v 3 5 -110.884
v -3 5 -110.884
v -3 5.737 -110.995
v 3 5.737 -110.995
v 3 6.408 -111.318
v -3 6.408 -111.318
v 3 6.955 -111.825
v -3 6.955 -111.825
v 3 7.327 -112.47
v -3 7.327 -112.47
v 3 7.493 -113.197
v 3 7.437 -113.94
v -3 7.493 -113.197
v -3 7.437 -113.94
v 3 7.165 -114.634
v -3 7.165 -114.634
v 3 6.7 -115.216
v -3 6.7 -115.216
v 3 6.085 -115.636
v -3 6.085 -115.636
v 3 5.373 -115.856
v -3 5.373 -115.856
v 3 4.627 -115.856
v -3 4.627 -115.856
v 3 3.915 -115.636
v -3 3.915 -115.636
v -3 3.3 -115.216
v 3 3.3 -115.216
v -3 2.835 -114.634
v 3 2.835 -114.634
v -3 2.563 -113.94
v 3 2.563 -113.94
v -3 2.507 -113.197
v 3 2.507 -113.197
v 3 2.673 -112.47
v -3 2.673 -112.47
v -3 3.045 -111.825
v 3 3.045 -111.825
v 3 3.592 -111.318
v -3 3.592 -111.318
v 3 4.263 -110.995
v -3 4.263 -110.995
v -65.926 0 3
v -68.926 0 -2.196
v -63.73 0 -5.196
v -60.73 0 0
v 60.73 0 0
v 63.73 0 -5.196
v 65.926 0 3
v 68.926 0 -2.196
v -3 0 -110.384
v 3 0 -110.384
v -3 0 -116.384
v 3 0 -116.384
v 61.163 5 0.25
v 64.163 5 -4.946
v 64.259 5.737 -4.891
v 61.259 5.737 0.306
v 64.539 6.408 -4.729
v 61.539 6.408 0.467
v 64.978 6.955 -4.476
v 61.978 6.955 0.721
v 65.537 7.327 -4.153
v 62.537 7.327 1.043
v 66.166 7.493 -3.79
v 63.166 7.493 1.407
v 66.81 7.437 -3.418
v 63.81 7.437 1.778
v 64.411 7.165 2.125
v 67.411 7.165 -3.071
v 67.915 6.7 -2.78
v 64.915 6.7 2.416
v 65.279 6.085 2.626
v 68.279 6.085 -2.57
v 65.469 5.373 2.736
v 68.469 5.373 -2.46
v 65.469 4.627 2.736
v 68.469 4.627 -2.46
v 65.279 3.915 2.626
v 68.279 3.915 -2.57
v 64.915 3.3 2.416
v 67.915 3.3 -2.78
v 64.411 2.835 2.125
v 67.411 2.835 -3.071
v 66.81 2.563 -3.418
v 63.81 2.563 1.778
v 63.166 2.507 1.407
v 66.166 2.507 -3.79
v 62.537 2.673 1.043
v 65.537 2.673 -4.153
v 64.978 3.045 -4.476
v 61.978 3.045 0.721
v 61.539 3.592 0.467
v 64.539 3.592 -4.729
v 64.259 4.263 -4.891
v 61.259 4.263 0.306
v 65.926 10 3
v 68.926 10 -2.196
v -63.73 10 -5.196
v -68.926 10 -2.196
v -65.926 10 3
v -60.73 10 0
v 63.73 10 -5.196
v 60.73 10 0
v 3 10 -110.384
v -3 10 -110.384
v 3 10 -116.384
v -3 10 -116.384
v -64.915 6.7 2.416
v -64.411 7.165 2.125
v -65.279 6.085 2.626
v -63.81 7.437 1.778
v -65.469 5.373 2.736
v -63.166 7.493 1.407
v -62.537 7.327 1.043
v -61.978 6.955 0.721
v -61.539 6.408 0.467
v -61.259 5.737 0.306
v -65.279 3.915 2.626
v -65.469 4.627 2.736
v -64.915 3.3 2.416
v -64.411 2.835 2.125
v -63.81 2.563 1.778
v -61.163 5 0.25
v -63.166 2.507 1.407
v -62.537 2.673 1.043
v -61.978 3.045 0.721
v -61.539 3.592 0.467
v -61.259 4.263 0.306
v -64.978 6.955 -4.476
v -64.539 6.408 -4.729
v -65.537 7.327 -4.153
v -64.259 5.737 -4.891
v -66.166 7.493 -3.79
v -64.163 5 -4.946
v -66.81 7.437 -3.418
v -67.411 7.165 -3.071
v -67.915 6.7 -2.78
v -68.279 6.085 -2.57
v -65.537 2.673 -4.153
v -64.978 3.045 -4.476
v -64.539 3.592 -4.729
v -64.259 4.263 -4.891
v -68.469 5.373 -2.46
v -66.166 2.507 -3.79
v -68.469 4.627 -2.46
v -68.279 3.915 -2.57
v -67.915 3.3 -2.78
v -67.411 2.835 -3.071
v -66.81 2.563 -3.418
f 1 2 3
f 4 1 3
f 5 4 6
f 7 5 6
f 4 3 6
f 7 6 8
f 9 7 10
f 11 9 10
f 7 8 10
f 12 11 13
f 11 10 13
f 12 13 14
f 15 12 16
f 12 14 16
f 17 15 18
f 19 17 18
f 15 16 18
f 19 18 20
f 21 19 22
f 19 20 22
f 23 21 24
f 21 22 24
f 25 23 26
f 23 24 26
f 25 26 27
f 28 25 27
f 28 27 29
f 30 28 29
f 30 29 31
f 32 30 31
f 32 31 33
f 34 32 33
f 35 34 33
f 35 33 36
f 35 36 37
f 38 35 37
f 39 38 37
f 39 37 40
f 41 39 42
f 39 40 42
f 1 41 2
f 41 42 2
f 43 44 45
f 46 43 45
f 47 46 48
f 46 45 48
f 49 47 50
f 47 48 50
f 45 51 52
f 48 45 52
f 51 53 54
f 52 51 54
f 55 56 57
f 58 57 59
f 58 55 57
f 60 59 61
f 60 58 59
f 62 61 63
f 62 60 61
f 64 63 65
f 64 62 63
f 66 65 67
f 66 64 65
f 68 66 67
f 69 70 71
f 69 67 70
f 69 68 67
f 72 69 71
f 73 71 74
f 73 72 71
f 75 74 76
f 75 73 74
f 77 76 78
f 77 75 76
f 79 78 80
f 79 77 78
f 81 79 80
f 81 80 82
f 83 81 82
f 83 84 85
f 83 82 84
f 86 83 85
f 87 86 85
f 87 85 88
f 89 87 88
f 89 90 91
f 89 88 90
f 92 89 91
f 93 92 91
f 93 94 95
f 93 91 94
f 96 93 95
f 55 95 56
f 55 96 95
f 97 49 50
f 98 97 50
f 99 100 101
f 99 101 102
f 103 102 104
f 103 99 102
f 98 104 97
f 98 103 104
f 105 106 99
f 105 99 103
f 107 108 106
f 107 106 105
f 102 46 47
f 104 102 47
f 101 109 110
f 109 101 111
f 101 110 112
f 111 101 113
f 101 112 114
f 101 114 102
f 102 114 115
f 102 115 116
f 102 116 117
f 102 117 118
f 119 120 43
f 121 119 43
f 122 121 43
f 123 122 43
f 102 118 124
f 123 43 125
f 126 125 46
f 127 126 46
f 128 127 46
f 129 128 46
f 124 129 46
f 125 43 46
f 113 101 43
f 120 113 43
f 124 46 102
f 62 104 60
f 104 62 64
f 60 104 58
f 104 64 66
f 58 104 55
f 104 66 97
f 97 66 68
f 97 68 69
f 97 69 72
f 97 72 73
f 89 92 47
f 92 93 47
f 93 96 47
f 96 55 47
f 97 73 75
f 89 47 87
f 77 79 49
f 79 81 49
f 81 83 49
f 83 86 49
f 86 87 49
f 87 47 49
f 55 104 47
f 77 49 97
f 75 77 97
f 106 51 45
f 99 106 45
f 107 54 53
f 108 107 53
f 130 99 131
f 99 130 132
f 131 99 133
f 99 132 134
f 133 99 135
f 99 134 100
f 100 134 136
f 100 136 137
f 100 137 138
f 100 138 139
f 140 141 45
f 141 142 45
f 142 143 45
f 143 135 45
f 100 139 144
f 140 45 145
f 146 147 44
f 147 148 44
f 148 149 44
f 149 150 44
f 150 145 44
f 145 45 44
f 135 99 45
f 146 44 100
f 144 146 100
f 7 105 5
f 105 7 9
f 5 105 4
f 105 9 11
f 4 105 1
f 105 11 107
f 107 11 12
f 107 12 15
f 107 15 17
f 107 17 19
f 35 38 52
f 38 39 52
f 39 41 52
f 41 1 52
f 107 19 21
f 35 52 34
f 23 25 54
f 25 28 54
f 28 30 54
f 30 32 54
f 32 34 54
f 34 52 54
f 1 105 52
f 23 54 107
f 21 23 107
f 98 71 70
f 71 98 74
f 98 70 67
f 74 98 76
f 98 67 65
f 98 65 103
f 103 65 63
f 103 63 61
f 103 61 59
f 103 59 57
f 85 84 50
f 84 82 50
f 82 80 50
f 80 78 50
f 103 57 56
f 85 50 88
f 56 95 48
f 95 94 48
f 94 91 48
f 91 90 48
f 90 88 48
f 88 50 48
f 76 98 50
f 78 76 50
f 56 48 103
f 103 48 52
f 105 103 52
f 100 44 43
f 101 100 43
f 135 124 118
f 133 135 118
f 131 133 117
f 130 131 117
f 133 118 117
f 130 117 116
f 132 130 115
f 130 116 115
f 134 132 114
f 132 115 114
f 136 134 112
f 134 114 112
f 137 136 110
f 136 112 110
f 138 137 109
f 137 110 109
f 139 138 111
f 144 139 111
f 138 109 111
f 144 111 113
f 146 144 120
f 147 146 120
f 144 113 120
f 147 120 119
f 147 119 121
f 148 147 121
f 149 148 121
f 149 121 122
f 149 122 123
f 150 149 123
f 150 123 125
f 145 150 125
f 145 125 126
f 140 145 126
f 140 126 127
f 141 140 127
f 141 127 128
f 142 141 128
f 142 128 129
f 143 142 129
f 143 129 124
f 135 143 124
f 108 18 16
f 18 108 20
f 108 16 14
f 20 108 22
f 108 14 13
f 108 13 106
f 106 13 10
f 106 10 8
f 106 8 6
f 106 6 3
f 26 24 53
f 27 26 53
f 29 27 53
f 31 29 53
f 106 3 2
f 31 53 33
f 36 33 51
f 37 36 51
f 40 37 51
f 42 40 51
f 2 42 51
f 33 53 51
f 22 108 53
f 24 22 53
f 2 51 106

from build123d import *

# Parameters (mm, degrees)
BOSS_EXTRUDE1_DEPTH = 10
SKETCH2_R           = 2.5
CUT_EXTRUDE1_DEPTH  = 134.326025
SKETCH3_R           = 2.5
CUT_EXTRUDE2_DEPTH  = 6


with BuildPart() as part:
    # Sketch1 → Boss-Extrude1 (new body)
    with BuildSketch(Plane(origin=(0, 0, 0), x_dir=(1, 0, 0), z_dir=(0, 1, 0))):
        Polygon((-3, 110.383597966), (-63.73, 5.196152423), (-68.926152423, 2.196152423), (-65.926152423, -3), (-60.73, 0), (60.73, 0), (65.926152423, -3), (68.926152423, 2.196152423), (63.73, 5.196152423), (3, 110.383597966), (3, 116.383597966), (-3, 116.383597966), align=None)
    extrude(amount=BOSS_EXTRUDE1_DEPTH)

    # Sketch2 → Cut-Extrude1 (cut)
    with BuildSketch(Plane(origin=(-15.1825, 0, -26.296861386), x_dir=(0.866025404, 0, -0.5), z_dir=(0.5, 0, 0.866025404))):
        with Locations((-55.593722772, 5)):
            Circle(SKETCH2_R)
    cut_extrude1 = extrude(amount=-CUT_EXTRUDE1_DEPTH, mode=Mode.SUBTRACT)

    # Mirror6: Cut-Extrude1 across plane
    add(cut_extrude1.mirror(Plane.ZY), mode=Mode.SUBTRACT)

    # Sketch3 → Cut-Extrude2 (cut)
    with BuildSketch(Plane.ZY.offset(2.999999999)):
        with Locations((-113.383597966, 5)):
            Circle(SKETCH3_R)
    extrude(amount=-CUT_EXTRUDE2_DEPTH, mode=Mode.SUBTRACT)


solid = part.part
